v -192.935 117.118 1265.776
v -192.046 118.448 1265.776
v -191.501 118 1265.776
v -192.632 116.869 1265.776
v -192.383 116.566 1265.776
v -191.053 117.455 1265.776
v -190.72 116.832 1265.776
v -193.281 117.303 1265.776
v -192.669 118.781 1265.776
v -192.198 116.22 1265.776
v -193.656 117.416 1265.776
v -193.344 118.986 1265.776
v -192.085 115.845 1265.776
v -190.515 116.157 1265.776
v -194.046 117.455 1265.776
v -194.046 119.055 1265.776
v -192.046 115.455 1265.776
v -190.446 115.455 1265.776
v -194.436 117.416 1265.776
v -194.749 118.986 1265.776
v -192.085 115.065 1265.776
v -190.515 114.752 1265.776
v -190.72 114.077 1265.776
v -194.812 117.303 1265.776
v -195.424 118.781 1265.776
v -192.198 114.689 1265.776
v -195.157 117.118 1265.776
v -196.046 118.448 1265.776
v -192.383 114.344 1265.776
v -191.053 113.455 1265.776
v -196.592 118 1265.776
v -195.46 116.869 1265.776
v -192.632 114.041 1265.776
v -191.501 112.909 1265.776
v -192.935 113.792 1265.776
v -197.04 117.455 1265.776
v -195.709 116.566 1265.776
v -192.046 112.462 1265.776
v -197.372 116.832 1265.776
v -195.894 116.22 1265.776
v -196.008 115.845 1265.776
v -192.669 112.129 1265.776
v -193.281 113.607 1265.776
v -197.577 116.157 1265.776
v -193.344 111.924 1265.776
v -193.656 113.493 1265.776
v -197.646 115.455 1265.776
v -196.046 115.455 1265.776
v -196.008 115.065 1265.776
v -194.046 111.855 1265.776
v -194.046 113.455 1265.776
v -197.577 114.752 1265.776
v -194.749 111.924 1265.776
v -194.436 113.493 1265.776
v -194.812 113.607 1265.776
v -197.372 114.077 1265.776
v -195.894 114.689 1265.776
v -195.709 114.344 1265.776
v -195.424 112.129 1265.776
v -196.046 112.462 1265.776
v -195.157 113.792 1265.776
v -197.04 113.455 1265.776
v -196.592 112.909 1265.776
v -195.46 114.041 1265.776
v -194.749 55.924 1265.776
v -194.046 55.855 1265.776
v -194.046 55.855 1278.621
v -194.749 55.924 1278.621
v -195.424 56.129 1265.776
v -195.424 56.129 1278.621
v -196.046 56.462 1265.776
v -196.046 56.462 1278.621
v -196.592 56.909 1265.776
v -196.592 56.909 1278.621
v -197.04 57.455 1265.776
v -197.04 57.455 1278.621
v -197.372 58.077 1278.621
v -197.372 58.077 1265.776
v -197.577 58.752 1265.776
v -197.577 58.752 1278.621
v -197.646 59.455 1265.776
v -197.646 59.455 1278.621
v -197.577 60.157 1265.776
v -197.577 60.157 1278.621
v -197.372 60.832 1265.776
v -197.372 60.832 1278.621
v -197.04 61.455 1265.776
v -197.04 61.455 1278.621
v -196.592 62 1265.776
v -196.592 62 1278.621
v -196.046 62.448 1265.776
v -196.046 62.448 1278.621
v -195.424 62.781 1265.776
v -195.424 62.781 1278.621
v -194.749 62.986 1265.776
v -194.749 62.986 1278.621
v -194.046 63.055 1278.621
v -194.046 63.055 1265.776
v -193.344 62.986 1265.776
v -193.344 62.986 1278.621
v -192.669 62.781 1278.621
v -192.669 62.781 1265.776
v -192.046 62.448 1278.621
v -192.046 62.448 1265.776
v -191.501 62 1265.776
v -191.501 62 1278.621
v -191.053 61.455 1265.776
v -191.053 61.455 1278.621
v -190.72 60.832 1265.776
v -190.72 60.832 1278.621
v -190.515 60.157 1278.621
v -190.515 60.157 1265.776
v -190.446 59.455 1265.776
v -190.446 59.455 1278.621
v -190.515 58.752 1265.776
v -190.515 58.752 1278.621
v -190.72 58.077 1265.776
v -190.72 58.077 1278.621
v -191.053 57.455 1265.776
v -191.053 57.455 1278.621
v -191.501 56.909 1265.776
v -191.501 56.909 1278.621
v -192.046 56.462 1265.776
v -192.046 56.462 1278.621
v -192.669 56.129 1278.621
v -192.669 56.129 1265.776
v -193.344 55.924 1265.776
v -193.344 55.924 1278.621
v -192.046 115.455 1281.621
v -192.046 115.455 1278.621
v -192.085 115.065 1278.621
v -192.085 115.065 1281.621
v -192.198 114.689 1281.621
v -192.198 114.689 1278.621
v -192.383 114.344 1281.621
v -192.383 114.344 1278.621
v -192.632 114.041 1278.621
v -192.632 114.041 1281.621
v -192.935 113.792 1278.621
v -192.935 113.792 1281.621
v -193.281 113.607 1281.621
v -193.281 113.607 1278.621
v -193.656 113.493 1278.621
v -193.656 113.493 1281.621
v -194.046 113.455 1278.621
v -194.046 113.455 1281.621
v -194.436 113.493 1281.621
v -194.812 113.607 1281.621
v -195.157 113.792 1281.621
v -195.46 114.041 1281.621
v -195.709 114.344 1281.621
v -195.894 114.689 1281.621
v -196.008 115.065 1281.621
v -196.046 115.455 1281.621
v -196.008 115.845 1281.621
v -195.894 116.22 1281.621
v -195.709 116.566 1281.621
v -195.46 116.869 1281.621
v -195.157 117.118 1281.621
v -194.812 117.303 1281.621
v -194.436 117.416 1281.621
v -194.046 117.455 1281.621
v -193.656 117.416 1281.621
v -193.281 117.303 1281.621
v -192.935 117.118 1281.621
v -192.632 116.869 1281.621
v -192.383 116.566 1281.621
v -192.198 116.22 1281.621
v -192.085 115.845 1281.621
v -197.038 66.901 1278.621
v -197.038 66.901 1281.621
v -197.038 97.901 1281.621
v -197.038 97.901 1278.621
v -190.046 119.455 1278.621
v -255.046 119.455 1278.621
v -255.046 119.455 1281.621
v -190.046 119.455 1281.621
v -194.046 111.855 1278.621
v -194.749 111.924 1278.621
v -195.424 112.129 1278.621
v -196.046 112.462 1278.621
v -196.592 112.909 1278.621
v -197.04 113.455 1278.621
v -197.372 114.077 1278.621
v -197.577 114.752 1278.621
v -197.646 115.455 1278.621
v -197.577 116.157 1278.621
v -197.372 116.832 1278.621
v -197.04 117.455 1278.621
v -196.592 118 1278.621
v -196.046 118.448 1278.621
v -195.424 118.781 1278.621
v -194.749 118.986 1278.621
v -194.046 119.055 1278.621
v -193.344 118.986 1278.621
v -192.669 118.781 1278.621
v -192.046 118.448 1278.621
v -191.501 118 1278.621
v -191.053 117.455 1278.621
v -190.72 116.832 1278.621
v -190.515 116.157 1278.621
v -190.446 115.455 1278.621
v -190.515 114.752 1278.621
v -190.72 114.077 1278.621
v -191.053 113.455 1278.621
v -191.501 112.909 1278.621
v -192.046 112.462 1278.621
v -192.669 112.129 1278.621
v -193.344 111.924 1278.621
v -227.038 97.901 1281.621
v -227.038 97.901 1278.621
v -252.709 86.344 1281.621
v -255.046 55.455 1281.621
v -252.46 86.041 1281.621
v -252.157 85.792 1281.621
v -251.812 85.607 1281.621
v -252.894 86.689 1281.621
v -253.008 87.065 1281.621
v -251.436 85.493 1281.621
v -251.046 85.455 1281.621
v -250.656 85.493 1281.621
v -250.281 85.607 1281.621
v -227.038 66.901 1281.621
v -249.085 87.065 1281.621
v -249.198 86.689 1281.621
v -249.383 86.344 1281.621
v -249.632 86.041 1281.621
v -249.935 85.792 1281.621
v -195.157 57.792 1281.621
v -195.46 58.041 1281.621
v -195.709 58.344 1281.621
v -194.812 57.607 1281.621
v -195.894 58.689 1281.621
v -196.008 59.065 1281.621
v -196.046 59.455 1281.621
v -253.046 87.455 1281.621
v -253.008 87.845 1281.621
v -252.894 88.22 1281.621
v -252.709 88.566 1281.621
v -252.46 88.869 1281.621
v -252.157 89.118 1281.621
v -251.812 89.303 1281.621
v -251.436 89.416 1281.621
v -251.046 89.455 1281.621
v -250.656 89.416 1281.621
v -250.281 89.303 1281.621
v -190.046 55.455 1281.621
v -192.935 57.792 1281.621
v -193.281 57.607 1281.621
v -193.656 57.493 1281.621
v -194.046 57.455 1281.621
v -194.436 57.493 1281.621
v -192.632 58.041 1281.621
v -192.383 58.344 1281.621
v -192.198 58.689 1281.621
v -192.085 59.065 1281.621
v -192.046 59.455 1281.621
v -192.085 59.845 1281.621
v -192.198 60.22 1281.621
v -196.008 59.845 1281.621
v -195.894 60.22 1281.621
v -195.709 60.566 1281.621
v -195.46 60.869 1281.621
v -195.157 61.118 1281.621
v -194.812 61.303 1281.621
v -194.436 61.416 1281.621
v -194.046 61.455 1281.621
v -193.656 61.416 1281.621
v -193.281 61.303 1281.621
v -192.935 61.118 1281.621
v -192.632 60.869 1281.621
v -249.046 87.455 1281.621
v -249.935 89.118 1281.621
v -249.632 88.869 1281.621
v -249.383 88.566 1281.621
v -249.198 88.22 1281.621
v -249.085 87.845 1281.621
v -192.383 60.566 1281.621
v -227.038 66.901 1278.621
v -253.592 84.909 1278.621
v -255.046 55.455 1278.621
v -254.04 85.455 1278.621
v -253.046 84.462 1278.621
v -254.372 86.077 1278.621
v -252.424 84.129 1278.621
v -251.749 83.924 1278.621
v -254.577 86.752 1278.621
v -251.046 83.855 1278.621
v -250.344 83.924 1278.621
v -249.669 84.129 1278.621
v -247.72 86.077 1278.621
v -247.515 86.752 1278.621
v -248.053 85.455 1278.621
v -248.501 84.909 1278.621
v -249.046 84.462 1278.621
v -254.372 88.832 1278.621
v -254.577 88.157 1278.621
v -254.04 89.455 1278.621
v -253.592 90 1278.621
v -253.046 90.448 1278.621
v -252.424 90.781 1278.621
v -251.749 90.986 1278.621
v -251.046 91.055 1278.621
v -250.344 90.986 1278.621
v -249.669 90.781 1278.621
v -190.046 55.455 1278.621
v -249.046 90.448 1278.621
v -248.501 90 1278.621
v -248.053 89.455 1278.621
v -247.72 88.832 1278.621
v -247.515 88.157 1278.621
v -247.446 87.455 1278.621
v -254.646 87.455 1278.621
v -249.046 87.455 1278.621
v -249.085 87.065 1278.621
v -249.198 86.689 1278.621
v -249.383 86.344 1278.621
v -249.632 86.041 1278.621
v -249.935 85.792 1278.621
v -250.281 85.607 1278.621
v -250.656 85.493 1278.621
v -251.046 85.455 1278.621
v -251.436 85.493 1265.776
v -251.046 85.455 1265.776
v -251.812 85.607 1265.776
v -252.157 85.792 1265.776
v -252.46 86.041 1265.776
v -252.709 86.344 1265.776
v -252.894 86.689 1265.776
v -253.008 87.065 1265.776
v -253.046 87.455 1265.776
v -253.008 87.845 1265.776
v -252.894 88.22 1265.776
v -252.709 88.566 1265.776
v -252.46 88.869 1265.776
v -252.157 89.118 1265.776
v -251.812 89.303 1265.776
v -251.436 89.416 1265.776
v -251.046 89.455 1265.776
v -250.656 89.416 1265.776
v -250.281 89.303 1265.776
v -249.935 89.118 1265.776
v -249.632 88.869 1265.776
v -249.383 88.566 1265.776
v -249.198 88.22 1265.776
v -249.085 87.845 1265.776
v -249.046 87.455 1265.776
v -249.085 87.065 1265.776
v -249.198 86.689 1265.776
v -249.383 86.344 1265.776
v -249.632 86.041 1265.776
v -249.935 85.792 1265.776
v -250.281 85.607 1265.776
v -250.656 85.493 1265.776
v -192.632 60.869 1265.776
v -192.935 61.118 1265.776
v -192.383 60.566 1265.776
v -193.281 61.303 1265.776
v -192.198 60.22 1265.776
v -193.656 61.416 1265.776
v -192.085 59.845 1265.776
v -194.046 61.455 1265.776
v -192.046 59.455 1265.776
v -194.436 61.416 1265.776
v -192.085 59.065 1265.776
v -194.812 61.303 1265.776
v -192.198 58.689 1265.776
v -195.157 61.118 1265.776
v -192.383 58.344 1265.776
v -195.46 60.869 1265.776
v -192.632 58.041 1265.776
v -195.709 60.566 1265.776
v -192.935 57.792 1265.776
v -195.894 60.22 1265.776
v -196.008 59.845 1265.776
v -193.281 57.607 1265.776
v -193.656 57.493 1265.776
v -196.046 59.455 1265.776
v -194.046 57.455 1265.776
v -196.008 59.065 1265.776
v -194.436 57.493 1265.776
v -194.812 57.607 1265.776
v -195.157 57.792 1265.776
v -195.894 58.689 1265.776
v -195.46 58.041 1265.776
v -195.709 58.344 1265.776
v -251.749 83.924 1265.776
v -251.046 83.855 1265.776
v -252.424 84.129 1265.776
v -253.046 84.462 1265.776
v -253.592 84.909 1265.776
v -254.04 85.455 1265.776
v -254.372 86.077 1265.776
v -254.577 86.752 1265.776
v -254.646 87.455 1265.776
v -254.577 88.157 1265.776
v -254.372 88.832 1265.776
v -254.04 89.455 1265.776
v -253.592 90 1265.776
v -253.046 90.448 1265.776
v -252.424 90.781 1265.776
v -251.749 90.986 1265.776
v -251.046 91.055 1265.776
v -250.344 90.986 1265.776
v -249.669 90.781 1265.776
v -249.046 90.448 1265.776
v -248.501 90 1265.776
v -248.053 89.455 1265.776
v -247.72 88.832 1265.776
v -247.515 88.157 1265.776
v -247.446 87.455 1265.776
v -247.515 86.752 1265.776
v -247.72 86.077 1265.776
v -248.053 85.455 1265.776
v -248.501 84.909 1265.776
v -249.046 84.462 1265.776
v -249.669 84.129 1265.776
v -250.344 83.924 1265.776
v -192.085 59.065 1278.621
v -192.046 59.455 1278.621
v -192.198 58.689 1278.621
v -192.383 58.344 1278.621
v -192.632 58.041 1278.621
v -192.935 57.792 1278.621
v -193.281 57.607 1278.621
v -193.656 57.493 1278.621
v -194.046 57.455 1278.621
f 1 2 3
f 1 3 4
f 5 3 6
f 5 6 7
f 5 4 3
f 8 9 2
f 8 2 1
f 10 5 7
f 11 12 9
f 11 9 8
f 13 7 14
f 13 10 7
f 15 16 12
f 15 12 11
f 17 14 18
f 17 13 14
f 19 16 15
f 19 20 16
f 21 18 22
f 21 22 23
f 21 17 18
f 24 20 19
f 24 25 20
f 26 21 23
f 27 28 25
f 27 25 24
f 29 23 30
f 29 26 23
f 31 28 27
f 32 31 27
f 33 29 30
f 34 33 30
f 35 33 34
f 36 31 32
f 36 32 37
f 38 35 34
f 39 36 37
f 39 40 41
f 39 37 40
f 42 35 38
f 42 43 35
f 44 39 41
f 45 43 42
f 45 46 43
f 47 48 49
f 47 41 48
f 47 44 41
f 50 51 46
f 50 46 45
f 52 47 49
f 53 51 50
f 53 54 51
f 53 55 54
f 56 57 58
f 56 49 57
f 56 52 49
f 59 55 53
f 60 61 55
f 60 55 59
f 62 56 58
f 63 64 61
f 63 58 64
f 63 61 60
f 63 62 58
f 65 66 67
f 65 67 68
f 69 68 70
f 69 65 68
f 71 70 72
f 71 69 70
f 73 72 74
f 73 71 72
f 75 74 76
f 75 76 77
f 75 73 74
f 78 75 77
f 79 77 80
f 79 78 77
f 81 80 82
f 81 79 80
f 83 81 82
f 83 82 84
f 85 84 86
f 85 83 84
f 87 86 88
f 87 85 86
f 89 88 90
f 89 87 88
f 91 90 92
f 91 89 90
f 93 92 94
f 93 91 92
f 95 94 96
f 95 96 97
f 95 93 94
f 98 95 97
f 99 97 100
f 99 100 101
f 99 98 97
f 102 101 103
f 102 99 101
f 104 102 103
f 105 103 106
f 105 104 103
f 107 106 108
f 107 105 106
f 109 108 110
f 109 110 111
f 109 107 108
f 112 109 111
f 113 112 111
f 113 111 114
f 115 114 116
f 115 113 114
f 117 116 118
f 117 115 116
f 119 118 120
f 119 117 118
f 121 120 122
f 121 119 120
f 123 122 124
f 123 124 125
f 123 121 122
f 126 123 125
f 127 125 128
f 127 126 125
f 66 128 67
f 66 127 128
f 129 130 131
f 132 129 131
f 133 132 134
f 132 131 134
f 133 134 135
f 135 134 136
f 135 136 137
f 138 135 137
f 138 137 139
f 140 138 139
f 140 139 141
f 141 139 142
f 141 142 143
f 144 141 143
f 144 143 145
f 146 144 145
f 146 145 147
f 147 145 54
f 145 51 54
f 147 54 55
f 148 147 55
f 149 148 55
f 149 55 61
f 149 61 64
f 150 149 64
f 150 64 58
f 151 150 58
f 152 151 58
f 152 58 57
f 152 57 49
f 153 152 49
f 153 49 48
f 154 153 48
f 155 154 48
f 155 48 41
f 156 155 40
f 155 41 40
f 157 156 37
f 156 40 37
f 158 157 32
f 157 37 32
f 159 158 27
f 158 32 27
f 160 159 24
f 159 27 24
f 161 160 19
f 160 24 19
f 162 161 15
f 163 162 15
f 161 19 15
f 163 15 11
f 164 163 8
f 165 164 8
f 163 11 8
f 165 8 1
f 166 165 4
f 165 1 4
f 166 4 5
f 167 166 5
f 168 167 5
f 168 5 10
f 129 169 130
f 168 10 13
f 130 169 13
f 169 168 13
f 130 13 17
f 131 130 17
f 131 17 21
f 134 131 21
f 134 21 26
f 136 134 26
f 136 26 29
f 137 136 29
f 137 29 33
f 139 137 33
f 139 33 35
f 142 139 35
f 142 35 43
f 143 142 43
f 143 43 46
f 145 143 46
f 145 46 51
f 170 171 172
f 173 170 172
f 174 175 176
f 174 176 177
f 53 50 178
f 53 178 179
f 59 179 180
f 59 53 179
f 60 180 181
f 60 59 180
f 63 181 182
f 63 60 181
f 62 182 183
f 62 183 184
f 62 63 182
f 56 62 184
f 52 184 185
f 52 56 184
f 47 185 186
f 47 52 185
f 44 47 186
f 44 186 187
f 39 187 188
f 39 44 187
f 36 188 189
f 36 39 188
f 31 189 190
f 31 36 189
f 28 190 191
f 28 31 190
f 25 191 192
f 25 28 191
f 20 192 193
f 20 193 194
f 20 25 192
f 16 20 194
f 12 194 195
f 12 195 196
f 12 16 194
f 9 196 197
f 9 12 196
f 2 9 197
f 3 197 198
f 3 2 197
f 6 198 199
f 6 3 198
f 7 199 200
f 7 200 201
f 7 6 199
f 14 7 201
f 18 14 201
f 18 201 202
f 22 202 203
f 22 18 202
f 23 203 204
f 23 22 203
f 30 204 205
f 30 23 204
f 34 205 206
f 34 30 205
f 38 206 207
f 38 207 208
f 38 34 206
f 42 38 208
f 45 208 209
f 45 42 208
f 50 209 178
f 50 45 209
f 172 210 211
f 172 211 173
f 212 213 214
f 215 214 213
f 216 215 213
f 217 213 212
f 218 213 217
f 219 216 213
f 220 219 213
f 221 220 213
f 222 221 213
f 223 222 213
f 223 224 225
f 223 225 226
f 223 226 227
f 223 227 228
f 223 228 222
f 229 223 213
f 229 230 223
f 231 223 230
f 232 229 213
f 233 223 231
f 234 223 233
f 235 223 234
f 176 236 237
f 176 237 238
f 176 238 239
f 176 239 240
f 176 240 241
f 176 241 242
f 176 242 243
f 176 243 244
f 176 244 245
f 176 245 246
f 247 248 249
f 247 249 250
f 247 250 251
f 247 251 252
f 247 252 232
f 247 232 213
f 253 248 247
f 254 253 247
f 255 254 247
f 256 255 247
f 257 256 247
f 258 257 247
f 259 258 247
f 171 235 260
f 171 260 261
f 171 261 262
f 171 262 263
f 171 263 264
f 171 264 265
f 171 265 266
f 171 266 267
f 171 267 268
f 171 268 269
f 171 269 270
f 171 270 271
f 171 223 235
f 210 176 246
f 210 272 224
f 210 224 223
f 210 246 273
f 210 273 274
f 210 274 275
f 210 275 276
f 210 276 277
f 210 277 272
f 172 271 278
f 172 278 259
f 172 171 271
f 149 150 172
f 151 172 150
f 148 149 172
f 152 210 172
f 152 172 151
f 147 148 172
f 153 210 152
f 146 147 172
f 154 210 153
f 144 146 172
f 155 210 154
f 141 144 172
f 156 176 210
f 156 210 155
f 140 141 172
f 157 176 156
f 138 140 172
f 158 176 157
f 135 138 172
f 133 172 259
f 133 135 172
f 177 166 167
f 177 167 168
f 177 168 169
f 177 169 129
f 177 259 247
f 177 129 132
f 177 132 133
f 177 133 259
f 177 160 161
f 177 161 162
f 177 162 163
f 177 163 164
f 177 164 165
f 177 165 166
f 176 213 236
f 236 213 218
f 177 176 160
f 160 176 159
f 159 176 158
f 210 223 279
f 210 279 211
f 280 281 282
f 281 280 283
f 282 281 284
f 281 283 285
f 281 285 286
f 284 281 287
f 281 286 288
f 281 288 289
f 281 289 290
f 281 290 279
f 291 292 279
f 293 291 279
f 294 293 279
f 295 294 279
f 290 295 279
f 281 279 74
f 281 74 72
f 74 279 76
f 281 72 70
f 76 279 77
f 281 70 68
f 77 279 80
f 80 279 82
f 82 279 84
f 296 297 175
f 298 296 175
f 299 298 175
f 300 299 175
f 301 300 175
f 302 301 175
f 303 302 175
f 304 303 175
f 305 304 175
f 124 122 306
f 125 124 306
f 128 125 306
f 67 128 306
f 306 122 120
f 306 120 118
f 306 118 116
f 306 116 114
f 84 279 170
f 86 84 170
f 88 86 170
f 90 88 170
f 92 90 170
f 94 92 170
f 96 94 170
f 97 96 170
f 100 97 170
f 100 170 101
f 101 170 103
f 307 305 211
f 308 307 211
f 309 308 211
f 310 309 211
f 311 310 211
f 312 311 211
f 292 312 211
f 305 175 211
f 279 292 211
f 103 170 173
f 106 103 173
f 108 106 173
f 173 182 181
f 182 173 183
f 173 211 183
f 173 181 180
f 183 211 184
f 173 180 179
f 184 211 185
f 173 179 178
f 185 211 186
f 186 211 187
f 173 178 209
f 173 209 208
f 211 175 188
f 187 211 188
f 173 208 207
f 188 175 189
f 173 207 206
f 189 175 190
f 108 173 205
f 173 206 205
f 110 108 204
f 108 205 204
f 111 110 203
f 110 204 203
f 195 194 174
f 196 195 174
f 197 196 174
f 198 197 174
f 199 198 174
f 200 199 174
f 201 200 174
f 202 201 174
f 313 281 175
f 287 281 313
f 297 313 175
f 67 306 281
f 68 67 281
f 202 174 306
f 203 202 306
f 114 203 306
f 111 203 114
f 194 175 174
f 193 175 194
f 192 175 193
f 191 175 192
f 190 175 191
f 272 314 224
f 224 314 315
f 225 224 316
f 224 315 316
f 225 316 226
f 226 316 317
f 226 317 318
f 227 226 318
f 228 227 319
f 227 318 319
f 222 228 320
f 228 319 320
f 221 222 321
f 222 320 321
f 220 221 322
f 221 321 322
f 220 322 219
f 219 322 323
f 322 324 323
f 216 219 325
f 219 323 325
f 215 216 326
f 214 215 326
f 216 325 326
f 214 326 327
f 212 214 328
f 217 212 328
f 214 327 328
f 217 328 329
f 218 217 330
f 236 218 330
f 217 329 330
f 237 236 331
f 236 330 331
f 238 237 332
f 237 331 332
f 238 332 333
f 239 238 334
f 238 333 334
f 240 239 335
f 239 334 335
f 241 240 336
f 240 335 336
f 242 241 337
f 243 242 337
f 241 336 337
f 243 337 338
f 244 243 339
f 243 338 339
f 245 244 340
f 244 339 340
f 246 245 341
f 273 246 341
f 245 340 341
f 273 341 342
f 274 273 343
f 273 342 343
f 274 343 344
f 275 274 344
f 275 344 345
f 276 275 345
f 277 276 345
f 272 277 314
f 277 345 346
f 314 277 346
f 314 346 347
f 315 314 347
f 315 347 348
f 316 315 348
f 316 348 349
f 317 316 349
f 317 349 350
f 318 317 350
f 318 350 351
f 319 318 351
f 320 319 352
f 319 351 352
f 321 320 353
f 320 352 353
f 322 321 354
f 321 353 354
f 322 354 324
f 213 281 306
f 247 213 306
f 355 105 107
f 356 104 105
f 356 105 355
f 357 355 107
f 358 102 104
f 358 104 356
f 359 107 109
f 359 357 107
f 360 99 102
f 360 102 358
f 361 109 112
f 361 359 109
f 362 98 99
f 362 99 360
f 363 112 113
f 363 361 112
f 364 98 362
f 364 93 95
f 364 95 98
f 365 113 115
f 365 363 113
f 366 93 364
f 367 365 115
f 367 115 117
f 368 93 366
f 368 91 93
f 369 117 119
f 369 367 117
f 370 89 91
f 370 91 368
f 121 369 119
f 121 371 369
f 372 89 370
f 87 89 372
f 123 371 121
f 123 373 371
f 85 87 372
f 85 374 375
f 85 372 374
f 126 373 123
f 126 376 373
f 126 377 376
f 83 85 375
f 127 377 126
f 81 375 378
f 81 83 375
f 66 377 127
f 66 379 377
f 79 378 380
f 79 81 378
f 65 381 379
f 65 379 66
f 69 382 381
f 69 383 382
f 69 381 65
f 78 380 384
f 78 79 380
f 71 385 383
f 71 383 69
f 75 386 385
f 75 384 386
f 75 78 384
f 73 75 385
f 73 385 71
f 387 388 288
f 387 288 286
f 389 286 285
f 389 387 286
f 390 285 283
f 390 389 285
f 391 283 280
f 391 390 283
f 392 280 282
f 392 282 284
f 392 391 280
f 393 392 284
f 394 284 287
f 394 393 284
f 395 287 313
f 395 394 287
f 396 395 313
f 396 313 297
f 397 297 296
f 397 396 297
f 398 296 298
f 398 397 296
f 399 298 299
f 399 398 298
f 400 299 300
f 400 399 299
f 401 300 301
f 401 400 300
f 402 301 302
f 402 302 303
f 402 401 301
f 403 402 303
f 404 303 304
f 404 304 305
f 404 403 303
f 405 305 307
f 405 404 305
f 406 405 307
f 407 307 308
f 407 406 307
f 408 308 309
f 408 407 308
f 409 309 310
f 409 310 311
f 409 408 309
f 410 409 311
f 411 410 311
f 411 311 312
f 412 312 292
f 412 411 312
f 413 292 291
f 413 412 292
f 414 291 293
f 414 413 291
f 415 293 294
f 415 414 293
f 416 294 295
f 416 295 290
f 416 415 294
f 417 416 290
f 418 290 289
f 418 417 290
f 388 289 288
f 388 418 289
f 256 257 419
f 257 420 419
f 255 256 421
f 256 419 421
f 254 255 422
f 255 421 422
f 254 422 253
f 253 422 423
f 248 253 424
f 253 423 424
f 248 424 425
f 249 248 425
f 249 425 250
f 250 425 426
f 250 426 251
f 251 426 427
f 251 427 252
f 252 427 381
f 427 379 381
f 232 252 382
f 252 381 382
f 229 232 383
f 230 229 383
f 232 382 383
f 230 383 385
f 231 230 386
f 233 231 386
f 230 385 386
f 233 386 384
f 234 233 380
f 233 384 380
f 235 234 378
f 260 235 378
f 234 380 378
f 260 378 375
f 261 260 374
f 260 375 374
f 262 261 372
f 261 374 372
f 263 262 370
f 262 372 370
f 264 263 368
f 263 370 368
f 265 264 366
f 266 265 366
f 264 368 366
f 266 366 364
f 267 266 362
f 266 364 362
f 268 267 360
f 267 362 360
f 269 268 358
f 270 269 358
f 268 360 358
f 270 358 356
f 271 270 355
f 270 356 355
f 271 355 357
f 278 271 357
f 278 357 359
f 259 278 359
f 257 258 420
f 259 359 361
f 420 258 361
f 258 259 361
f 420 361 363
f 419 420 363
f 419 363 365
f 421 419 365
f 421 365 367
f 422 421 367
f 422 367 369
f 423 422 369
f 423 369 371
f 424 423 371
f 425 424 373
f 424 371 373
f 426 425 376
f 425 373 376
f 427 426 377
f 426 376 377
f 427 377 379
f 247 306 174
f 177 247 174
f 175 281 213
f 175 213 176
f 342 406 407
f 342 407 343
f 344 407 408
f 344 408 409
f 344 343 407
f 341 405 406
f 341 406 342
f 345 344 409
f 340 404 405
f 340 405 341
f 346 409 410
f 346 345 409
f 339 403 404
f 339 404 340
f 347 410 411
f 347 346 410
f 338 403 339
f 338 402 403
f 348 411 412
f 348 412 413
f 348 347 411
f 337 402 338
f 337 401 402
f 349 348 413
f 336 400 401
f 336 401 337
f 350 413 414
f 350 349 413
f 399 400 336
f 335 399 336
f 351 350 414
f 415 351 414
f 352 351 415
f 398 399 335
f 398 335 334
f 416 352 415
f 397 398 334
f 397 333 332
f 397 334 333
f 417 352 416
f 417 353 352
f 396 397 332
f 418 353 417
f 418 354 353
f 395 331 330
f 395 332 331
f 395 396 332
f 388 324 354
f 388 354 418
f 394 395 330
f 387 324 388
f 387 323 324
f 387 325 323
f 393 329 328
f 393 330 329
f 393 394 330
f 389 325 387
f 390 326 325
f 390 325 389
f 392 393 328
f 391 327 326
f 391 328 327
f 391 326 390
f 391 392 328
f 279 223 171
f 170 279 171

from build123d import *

# Parameters (mm, degrees)
SKETCH1_W             = 65
SKETCH1_H             = 64
BOSS_EXTRUDE1_DEPTH   = 3
F_4_0MM_DOWEL_HOLE1_D = 4
BOSS_EXTRUDE2_START   = 12.845580916
SKETCH4_R             = 3.6
SKETCH4_R_2           = 2
BOSS_EXTRUDE2_DEPTH   = 12.845580916
CUT_EXTRUDE4_REACH    = 284.08
SKETCH5_W             = 30
SKETCH5_H             = 31


with BuildPart() as part:
    # Sketch1 → Boss-Extrude1 (new body)
    with BuildSketch(Plane(origin=(0, -5.589e-05, 1278.621377902), x_dir=(1, 0, 0), z_dir=(0, -4.371138800000001e-08, 0.999999999999999))):
        with Locations((-222.546248068, 87.454866132)):
            Rectangle(SKETCH1_W, SKETCH1_H)
    extrude(amount=BOSS_EXTRUDE1_DEPTH)

    # Ø4.0mm Dowel Hole1 (through all)
    with Locations(Plane(origin=(0, -5.6021e-05, 1281.621377902), x_dir=(-1, 0, 0), z_dir=(0, -4.371138867531602e-08, 0.999999999999999))):
        with Locations((251.046248068, -87.454866132), (194.046248068, -115.454866132), (194.046248068, -59.454866132)):
            Hole(F_4_0MM_DOWEL_HOLE1_D / 2)

    # Sketch4 → Boss-Extrude2 (add)
    # profile 1 of 3: a face of its own
    with BuildSketch(Plane(origin=(0, -5.589e-05, 1278.621377902), x_dir=(-1, 0, 0), z_dir=(0, 4.371138867531603e-08, -0.9999999999999991)).offset(BOSS_EXTRUDE2_START)):
        with Locations(Location((194.046248068, 115.454866132, 0), (0, 0, 270))):
            Circle(SKETCH4_R)
        with Locations(Location((194.046248068, 115.454866132, 0), (0, 0, 270))):
            Circle(SKETCH4_R_2, mode=Mode.SUBTRACT)
    # profile 2 of 3: a face of its own
    with BuildSketch(Plane(origin=(0, -5.589e-05, 1278.621377902), x_dir=(-1, 0, 0), z_dir=(0, 4.371138867531603e-08, -0.9999999999999991)).offset(BOSS_EXTRUDE2_START)):
        with Locations(Location((251.046248068, 87.454866132, 0), (0, 0, 270))):
            Circle(SKETCH4_R)
        with Locations(Location((251.046248068, 87.454866132, 0), (0, 0, 270))):
            Circle(SKETCH4_R_2, mode=Mode.SUBTRACT)
    # profile 3 of 3: a face of its own
    with BuildSketch(Plane(origin=(0, -5.589e-05, 1278.621377902), x_dir=(-1, 0, 0), z_dir=(0, 4.371138867531603e-08, -0.9999999999999991)).offset(BOSS_EXTRUDE2_START)):
        with Locations(Location((194.046248068, 59.454866132, 0), (0, 0, 270))):
            Circle(SKETCH4_R)
        with Locations(Location((194.046248068, 59.454866132, 0), (0, 0, 270))):
            Circle(SKETCH4_R_2, mode=Mode.SUBTRACT)
    extrude(amount=-BOSS_EXTRUDE2_DEPTH)

    # Sketch5 → Cut-Extrude4 (cut, up to next)
    with BuildSketch(Plane(origin=(0, -5.6021e-05, 1281.621377902), x_dir=(1, 0, 0), z_dir=(0, -4.371138867531602e-08, 0.999999999999999)), mode=Mode.PRIVATE) as cut_extrude4_sk1:
        with Locations((-212.038243782, 82.401305574)):
            Rectangle(SKETCH5_W, SKETCH5_H)
    cut_extrude4_tool1 = extrude(cut_extrude4_sk1.sketch, amount=-CUT_EXTRUDE4_REACH, mode=Mode.PRIVATE) & part.part
    add(cut_extrude4_tool1.solids().sort_by_distance((-212.038244, 82.40125, 1281.621382))[0], mode=Mode.SUBTRACT)


solid = part.part
